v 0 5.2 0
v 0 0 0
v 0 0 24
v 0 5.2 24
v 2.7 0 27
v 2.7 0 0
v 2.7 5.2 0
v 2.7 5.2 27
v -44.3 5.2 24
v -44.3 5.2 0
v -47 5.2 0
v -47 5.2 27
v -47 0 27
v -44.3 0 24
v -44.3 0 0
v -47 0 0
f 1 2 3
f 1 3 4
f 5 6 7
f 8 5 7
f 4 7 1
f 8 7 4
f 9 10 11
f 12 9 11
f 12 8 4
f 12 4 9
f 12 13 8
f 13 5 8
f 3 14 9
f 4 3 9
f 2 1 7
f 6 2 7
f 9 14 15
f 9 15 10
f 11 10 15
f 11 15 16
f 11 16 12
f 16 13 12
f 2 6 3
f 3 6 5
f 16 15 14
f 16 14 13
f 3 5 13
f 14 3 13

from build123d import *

# Parameters (mm, degrees)
SKETCH1_W           = 2.7
SKETCH1_H           = 5.2
BOSS_EXTRUDE1_DEPTH = 27
SKETCH2_W           = 3
SKETCH2_H           = 5.2
BOSS_EXTRUDE2_DEPTH = 47
SKETCH3_W           = 2.7
SKETCH3_H           = 5.2
BOSS_EXTRUDE3_DEPTH = 24


with BuildPart() as part:
    # Sketch1 → Boss-Extrude1 (new body)
    with BuildSketch(Plane.XY):
        with Locations((1.35, 2.6)):
            Rectangle(SKETCH1_W, SKETCH1_H)
    extrude(amount=BOSS_EXTRUDE1_DEPTH)

    # Sketch2 → Boss-Extrude2 (add)
    with BuildSketch(Plane.ZY):
        with Locations((25.5, 2.6)):
            Rectangle(SKETCH2_W, SKETCH2_H)
    extrude(amount=BOSS_EXTRUDE2_DEPTH)

    # Sketch3 → Boss-Extrude3 (add)
    with BuildSketch(Plane(origin=(0, 0, 24), x_dir=(-1, 0, 0), z_dir=(0, 0, -1))):
        with Locations((45.65, 2.6)):
            Rectangle(SKETCH3_W, SKETCH3_H)
    extrude(amount=BOSS_EXTRUDE3_DEPTH)


solid = part.part
